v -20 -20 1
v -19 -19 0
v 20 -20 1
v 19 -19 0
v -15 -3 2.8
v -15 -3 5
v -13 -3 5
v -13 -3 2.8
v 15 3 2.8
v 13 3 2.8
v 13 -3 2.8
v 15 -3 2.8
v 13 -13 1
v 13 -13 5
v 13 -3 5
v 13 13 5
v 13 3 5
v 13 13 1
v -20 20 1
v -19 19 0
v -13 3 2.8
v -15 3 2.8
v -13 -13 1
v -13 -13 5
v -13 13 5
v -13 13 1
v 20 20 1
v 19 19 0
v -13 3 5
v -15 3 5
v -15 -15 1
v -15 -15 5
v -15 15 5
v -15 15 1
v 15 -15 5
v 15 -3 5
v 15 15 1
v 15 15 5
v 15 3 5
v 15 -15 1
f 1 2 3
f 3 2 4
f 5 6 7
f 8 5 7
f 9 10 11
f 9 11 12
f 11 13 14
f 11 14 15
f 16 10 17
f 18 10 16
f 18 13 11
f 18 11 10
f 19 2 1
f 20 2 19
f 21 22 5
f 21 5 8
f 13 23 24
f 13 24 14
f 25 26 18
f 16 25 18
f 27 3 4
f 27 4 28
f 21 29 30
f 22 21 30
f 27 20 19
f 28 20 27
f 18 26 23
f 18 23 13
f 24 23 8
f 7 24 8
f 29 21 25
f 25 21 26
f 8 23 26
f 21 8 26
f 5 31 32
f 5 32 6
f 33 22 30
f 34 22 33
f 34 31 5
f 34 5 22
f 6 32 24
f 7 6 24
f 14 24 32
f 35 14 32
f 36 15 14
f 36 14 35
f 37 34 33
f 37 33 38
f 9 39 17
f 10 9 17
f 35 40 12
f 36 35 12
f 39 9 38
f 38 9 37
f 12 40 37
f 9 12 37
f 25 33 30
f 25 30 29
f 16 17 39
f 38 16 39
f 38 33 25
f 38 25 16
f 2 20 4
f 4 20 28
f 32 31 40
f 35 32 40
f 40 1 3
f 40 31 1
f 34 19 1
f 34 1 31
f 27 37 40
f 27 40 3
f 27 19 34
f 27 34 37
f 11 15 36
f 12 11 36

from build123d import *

# Parameters (mm, degrees)
F0_W     = 30
F0_H     = 30
F0_W_2   = 26
F0_H_2   = 26
F1_DEPTH = 5
F0_W_3   = 39.9999991059
F0_H_3   = 39.9999991059
F2_DEPTH = 1
F3_W     = 2
F3_H     = 6
F3_W_2   = 26
F4_DEPTH = 2.2
F6_SIZE  = 0.99999


# Not quite as in the source:
# - a fillet or chamfer is up to 0.001 mm smaller than in the source, because OpenCascade refuses the exact size
# - a feature of the source that left no trace in its solid (it failed there, or was rolled back) is left out


with BuildPart() as f1:
    # F0 (on Top) → F1 (new body)
    with BuildSketch(Plane.XY):
        Rectangle(F0_W, F0_H)
        Rectangle(F0_W_2, F0_H_2, mode=Mode.SUBTRACT)
    extrude(amount=F1_DEPTH)

    # F0 (on Top) → F2 (join)
    with BuildSketch(Plane.XY):
        Rectangle(F0_W_3, F0_H_3)
        Rectangle(F0_W, F0_H, mode=Mode.SUBTRACT)
        Rectangle(F0_W_2, F0_H_2)
    extrude(amount=F2_DEPTH)

    # F3 (on face) → F4 (cut)
    with BuildSketch(Plane.XY.offset(5)):
        with Locations((-14, 0)):
            Rectangle(F3_W, F3_H)
        Rectangle(F3_W_2, F3_H)
        with Locations((14, 0)):
            Rectangle(F3_W, F3_H)
    extrude(amount=-F4_DEPTH, mode=Mode.SUBTRACT)

    # F6 (size 1 in the source; OpenCascade refuses exactly that, so slightly less here)
    f6_edges = [f1.edges().sort_by_distance(p)[0] for p in [
        (-20, 0, 0),
        (0, -20, 0),
        (20, 0, 0),
        (0, 20, 0),
    ]]
    chamfer(f6_edges, length=F6_SIZE)


solid = f1.part
